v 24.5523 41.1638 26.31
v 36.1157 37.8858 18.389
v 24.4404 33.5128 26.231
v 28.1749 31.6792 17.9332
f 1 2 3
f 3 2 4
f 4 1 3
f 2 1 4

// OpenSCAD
// Auto-generated auxetic polyhedron
points = [
    [24.440377, 33.512833, 26.231026],
    [36.115730, 37.885779, 18.388958],
    [24.552296, 41.163828, 26.310034],
    [28.174933, 31.679217, 17.933196],
];

faces = [
    [0, 1, 2],
    [3, 1, 0],
    [0, 2, 3],
    [3, 2, 1],
];

polyhedron(points = points, faces = faces);
